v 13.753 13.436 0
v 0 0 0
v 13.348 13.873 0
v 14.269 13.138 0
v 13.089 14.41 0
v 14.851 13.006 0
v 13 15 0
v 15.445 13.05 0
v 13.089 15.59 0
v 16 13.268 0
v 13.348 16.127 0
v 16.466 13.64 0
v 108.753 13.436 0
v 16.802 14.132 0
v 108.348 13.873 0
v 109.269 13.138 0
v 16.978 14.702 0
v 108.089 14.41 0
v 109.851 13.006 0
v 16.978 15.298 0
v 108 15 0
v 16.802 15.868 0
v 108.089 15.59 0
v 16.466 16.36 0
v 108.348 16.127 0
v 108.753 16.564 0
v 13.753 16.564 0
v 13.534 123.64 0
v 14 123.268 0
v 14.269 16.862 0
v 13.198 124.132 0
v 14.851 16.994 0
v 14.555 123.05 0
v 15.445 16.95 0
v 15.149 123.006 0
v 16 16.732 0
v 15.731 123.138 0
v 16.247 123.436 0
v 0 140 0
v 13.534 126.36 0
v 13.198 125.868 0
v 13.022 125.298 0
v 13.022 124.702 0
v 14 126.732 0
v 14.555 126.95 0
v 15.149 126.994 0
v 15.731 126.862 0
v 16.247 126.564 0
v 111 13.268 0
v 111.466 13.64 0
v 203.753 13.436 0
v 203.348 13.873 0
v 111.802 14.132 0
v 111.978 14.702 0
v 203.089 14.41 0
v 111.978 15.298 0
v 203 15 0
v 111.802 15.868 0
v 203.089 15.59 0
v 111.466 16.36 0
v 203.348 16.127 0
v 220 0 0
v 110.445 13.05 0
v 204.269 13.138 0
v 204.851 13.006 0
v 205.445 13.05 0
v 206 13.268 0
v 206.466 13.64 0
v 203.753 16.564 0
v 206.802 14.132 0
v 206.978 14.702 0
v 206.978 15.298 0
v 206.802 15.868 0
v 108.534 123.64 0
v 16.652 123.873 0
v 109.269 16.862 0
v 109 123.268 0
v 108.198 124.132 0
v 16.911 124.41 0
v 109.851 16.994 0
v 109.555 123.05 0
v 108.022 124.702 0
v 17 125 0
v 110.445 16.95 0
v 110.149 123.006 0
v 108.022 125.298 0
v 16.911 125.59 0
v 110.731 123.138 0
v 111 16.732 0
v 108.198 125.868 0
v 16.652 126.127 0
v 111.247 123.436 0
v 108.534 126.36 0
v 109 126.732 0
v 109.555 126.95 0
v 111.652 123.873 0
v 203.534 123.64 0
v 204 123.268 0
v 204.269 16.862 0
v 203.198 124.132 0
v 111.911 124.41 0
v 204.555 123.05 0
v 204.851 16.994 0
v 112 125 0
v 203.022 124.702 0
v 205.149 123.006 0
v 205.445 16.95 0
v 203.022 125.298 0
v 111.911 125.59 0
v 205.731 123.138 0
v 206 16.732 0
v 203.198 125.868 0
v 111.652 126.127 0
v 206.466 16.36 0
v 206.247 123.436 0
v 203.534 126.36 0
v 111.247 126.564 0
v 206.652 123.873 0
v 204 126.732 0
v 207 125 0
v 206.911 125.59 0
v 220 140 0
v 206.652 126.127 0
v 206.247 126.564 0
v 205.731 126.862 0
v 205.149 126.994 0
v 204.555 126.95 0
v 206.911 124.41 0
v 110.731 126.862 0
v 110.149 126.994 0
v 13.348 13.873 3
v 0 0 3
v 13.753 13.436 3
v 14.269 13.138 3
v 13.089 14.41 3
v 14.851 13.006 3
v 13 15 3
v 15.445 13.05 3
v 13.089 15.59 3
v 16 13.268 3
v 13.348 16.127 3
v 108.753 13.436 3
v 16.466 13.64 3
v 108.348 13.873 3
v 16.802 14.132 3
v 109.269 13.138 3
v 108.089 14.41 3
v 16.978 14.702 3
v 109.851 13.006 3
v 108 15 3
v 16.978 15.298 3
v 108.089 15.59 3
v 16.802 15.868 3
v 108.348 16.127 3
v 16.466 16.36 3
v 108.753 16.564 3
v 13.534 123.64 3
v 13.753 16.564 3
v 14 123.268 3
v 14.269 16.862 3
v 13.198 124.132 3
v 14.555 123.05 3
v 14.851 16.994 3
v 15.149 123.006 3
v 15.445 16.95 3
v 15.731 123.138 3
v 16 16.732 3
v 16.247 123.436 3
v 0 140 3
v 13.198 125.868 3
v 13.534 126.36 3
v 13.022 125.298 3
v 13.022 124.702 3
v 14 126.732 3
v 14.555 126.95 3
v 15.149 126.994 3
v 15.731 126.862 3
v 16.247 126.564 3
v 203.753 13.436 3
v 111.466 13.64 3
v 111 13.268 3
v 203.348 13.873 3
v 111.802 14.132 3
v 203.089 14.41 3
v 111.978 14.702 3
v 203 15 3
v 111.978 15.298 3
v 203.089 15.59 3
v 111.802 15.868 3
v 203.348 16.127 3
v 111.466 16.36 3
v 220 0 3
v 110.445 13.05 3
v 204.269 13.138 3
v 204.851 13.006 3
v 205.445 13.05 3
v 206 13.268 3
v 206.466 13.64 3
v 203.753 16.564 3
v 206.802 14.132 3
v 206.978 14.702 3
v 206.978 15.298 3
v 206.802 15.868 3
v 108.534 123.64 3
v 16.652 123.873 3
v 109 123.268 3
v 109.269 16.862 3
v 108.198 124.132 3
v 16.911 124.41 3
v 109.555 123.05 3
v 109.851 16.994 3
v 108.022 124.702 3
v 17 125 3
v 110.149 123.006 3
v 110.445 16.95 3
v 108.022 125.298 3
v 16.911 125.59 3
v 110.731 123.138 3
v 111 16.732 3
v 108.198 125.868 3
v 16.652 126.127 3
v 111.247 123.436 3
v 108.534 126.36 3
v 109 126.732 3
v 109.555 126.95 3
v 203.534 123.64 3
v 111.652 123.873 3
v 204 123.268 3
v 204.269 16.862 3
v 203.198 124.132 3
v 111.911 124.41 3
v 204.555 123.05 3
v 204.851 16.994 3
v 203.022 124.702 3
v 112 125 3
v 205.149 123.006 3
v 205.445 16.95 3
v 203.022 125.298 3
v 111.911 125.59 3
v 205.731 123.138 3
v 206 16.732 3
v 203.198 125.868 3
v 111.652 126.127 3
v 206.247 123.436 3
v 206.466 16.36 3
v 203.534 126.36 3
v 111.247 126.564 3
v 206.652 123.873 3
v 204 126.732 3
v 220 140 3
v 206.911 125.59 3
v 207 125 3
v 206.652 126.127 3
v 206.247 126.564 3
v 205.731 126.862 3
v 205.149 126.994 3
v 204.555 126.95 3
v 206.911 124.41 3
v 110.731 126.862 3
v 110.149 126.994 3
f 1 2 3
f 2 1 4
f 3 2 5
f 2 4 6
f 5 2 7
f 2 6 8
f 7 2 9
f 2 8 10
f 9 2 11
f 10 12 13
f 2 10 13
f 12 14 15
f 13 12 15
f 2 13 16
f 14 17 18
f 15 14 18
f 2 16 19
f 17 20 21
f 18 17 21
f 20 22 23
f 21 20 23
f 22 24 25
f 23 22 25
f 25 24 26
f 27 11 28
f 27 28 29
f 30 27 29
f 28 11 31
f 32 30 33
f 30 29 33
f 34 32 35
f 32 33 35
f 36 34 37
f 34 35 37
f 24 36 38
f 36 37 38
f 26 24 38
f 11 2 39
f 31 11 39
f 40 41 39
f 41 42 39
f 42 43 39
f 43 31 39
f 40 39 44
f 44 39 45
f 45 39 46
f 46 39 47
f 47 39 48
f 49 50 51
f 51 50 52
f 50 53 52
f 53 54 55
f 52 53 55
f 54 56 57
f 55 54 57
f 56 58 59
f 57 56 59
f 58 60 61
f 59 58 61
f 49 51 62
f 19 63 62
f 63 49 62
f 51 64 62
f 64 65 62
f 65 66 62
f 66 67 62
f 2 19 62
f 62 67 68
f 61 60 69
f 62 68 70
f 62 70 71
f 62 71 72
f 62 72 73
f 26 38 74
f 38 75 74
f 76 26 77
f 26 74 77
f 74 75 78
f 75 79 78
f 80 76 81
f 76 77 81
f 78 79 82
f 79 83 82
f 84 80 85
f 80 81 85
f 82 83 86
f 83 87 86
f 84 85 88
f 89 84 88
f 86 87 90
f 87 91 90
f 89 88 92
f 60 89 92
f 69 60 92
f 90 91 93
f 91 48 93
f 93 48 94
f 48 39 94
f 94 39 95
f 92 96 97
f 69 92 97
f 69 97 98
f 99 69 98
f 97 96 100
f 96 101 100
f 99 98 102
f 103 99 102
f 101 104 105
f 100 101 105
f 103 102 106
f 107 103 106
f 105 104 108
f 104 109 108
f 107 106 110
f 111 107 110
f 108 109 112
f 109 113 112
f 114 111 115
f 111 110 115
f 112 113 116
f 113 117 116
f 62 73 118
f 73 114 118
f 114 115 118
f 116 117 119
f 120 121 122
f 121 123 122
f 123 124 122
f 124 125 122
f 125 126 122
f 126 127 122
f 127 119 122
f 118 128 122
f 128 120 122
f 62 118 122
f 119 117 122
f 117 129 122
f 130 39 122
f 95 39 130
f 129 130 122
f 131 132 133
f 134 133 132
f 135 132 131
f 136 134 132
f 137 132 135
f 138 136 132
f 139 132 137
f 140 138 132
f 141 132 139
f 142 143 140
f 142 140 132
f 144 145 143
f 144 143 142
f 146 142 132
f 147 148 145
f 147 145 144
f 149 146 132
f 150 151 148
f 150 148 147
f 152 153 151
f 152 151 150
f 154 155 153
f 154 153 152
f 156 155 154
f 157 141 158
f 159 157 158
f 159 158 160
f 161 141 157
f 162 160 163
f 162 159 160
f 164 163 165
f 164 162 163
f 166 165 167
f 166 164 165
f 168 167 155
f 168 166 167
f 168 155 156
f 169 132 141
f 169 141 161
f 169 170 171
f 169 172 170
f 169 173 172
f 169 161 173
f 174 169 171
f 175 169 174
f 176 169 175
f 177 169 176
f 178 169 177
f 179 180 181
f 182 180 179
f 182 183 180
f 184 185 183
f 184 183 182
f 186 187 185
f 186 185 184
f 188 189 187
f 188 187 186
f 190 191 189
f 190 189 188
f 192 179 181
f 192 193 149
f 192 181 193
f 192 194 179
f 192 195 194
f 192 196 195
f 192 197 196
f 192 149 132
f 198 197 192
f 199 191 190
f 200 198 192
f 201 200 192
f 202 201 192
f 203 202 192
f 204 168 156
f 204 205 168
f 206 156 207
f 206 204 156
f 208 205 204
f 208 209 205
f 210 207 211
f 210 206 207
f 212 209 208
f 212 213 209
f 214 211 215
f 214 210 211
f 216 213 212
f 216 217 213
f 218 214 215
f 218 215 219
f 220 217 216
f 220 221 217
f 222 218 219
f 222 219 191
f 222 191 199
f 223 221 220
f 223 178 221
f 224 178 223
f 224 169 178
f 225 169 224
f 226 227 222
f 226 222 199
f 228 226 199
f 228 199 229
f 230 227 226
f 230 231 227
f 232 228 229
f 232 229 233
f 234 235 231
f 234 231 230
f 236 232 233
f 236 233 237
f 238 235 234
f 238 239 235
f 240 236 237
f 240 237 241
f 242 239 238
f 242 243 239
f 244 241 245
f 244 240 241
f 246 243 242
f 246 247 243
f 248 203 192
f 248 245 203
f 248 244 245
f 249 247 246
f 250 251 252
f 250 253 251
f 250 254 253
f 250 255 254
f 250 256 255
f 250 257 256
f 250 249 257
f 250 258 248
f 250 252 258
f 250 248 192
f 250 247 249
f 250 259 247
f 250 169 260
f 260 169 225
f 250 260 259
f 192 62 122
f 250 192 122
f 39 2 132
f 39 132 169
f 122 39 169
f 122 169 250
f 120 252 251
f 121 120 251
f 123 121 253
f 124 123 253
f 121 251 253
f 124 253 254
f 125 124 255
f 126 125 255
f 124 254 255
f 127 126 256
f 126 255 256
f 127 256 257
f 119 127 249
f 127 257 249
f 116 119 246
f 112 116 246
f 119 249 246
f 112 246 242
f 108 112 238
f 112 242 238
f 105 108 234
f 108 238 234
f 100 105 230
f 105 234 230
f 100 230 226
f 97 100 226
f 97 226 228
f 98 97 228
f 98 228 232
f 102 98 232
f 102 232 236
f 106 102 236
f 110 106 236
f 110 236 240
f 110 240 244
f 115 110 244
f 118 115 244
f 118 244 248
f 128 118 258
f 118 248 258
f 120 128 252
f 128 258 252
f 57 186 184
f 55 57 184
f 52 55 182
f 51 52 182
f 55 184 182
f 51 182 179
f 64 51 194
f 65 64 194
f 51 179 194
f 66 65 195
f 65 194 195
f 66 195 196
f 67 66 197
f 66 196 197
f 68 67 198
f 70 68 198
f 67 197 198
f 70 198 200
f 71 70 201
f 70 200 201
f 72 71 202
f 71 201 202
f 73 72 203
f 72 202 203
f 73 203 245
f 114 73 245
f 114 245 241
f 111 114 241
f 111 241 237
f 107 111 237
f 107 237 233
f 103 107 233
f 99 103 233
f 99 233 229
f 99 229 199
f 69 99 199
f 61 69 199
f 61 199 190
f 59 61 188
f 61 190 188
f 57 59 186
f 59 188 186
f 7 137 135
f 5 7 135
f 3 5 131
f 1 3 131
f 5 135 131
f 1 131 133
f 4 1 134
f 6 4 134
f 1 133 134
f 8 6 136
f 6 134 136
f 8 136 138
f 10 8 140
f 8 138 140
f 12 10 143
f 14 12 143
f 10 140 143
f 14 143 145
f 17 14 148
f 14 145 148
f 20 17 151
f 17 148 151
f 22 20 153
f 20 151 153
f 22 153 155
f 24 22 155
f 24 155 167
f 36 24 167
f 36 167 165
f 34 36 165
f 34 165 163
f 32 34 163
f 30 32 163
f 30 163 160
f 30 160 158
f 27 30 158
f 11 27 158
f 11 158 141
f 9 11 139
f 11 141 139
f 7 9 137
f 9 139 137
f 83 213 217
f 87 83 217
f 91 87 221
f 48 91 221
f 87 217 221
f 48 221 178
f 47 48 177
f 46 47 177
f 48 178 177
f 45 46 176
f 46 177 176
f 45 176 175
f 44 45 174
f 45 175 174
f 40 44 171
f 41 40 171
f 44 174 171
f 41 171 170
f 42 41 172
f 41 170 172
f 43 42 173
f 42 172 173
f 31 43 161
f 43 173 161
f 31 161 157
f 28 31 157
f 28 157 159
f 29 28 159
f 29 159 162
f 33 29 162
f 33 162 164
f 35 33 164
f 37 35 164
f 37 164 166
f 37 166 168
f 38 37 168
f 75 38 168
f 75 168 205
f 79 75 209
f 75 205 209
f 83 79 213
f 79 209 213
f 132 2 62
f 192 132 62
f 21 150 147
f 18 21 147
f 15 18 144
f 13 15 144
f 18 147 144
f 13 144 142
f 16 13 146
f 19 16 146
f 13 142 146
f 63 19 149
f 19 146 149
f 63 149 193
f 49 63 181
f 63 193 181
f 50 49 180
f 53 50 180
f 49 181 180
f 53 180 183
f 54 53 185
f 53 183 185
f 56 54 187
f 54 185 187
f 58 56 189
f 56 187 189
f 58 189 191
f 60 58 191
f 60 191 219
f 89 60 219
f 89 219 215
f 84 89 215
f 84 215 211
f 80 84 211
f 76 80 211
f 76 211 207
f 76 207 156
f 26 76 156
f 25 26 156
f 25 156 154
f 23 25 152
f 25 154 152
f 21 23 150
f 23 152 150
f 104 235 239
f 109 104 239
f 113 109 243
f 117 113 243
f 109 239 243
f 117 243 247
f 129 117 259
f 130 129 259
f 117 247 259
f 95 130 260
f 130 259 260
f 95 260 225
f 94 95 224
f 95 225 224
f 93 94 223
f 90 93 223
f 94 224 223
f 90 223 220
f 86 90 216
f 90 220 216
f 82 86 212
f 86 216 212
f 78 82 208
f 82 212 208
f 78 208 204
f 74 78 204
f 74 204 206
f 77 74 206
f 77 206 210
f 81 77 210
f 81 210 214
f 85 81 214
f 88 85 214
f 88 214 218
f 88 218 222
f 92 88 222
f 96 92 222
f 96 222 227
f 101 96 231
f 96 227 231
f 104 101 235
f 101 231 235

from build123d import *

# Parameters (mm, degrees)
IZIM1_W                     = 220
IZIM1_H                     = 140
Y_KSEKLIK_EKSTR_ZYON1_DEPTH = 3
IZIM2_R                     = 2
KES_EKSTR_ZYON1_DEPTH       = 3


with BuildPart() as part:
    # Çizim1 → Yükseklik-Ekstrüzyon1 (new body)
    with BuildSketch(Plane.XY):
        with Locations((110, 70)):
            Rectangle(IZIM1_W, IZIM1_H)
    extrude(amount=Y_KSEKLIK_EKSTR_ZYON1_DEPTH)

    # Çizim2 → Kes-Ekstrüzyon1 (cut)
    with BuildSketch(Plane.XY.offset(3)):
        with Locations((15, 125)):
            Circle(IZIM2_R)
        with Locations((205, 125)):
            Circle(IZIM2_R)
        with Locations((110, 125)):
            Circle(IZIM2_R)
        with Locations(Location((205, 15, 0), (0, 0, 180))):
            Circle(IZIM2_R)
        with Locations(Location((110, 15, 0), (0, 0, 180))):
            Circle(IZIM2_R)
        with Locations(Location((15, 15, 0), (0, 0, 180))):
            Circle(IZIM2_R)
    extrude(amount=-KES_EKSTR_ZYON1_DEPTH, mode=Mode.SUBTRACT)


solid = part.part
